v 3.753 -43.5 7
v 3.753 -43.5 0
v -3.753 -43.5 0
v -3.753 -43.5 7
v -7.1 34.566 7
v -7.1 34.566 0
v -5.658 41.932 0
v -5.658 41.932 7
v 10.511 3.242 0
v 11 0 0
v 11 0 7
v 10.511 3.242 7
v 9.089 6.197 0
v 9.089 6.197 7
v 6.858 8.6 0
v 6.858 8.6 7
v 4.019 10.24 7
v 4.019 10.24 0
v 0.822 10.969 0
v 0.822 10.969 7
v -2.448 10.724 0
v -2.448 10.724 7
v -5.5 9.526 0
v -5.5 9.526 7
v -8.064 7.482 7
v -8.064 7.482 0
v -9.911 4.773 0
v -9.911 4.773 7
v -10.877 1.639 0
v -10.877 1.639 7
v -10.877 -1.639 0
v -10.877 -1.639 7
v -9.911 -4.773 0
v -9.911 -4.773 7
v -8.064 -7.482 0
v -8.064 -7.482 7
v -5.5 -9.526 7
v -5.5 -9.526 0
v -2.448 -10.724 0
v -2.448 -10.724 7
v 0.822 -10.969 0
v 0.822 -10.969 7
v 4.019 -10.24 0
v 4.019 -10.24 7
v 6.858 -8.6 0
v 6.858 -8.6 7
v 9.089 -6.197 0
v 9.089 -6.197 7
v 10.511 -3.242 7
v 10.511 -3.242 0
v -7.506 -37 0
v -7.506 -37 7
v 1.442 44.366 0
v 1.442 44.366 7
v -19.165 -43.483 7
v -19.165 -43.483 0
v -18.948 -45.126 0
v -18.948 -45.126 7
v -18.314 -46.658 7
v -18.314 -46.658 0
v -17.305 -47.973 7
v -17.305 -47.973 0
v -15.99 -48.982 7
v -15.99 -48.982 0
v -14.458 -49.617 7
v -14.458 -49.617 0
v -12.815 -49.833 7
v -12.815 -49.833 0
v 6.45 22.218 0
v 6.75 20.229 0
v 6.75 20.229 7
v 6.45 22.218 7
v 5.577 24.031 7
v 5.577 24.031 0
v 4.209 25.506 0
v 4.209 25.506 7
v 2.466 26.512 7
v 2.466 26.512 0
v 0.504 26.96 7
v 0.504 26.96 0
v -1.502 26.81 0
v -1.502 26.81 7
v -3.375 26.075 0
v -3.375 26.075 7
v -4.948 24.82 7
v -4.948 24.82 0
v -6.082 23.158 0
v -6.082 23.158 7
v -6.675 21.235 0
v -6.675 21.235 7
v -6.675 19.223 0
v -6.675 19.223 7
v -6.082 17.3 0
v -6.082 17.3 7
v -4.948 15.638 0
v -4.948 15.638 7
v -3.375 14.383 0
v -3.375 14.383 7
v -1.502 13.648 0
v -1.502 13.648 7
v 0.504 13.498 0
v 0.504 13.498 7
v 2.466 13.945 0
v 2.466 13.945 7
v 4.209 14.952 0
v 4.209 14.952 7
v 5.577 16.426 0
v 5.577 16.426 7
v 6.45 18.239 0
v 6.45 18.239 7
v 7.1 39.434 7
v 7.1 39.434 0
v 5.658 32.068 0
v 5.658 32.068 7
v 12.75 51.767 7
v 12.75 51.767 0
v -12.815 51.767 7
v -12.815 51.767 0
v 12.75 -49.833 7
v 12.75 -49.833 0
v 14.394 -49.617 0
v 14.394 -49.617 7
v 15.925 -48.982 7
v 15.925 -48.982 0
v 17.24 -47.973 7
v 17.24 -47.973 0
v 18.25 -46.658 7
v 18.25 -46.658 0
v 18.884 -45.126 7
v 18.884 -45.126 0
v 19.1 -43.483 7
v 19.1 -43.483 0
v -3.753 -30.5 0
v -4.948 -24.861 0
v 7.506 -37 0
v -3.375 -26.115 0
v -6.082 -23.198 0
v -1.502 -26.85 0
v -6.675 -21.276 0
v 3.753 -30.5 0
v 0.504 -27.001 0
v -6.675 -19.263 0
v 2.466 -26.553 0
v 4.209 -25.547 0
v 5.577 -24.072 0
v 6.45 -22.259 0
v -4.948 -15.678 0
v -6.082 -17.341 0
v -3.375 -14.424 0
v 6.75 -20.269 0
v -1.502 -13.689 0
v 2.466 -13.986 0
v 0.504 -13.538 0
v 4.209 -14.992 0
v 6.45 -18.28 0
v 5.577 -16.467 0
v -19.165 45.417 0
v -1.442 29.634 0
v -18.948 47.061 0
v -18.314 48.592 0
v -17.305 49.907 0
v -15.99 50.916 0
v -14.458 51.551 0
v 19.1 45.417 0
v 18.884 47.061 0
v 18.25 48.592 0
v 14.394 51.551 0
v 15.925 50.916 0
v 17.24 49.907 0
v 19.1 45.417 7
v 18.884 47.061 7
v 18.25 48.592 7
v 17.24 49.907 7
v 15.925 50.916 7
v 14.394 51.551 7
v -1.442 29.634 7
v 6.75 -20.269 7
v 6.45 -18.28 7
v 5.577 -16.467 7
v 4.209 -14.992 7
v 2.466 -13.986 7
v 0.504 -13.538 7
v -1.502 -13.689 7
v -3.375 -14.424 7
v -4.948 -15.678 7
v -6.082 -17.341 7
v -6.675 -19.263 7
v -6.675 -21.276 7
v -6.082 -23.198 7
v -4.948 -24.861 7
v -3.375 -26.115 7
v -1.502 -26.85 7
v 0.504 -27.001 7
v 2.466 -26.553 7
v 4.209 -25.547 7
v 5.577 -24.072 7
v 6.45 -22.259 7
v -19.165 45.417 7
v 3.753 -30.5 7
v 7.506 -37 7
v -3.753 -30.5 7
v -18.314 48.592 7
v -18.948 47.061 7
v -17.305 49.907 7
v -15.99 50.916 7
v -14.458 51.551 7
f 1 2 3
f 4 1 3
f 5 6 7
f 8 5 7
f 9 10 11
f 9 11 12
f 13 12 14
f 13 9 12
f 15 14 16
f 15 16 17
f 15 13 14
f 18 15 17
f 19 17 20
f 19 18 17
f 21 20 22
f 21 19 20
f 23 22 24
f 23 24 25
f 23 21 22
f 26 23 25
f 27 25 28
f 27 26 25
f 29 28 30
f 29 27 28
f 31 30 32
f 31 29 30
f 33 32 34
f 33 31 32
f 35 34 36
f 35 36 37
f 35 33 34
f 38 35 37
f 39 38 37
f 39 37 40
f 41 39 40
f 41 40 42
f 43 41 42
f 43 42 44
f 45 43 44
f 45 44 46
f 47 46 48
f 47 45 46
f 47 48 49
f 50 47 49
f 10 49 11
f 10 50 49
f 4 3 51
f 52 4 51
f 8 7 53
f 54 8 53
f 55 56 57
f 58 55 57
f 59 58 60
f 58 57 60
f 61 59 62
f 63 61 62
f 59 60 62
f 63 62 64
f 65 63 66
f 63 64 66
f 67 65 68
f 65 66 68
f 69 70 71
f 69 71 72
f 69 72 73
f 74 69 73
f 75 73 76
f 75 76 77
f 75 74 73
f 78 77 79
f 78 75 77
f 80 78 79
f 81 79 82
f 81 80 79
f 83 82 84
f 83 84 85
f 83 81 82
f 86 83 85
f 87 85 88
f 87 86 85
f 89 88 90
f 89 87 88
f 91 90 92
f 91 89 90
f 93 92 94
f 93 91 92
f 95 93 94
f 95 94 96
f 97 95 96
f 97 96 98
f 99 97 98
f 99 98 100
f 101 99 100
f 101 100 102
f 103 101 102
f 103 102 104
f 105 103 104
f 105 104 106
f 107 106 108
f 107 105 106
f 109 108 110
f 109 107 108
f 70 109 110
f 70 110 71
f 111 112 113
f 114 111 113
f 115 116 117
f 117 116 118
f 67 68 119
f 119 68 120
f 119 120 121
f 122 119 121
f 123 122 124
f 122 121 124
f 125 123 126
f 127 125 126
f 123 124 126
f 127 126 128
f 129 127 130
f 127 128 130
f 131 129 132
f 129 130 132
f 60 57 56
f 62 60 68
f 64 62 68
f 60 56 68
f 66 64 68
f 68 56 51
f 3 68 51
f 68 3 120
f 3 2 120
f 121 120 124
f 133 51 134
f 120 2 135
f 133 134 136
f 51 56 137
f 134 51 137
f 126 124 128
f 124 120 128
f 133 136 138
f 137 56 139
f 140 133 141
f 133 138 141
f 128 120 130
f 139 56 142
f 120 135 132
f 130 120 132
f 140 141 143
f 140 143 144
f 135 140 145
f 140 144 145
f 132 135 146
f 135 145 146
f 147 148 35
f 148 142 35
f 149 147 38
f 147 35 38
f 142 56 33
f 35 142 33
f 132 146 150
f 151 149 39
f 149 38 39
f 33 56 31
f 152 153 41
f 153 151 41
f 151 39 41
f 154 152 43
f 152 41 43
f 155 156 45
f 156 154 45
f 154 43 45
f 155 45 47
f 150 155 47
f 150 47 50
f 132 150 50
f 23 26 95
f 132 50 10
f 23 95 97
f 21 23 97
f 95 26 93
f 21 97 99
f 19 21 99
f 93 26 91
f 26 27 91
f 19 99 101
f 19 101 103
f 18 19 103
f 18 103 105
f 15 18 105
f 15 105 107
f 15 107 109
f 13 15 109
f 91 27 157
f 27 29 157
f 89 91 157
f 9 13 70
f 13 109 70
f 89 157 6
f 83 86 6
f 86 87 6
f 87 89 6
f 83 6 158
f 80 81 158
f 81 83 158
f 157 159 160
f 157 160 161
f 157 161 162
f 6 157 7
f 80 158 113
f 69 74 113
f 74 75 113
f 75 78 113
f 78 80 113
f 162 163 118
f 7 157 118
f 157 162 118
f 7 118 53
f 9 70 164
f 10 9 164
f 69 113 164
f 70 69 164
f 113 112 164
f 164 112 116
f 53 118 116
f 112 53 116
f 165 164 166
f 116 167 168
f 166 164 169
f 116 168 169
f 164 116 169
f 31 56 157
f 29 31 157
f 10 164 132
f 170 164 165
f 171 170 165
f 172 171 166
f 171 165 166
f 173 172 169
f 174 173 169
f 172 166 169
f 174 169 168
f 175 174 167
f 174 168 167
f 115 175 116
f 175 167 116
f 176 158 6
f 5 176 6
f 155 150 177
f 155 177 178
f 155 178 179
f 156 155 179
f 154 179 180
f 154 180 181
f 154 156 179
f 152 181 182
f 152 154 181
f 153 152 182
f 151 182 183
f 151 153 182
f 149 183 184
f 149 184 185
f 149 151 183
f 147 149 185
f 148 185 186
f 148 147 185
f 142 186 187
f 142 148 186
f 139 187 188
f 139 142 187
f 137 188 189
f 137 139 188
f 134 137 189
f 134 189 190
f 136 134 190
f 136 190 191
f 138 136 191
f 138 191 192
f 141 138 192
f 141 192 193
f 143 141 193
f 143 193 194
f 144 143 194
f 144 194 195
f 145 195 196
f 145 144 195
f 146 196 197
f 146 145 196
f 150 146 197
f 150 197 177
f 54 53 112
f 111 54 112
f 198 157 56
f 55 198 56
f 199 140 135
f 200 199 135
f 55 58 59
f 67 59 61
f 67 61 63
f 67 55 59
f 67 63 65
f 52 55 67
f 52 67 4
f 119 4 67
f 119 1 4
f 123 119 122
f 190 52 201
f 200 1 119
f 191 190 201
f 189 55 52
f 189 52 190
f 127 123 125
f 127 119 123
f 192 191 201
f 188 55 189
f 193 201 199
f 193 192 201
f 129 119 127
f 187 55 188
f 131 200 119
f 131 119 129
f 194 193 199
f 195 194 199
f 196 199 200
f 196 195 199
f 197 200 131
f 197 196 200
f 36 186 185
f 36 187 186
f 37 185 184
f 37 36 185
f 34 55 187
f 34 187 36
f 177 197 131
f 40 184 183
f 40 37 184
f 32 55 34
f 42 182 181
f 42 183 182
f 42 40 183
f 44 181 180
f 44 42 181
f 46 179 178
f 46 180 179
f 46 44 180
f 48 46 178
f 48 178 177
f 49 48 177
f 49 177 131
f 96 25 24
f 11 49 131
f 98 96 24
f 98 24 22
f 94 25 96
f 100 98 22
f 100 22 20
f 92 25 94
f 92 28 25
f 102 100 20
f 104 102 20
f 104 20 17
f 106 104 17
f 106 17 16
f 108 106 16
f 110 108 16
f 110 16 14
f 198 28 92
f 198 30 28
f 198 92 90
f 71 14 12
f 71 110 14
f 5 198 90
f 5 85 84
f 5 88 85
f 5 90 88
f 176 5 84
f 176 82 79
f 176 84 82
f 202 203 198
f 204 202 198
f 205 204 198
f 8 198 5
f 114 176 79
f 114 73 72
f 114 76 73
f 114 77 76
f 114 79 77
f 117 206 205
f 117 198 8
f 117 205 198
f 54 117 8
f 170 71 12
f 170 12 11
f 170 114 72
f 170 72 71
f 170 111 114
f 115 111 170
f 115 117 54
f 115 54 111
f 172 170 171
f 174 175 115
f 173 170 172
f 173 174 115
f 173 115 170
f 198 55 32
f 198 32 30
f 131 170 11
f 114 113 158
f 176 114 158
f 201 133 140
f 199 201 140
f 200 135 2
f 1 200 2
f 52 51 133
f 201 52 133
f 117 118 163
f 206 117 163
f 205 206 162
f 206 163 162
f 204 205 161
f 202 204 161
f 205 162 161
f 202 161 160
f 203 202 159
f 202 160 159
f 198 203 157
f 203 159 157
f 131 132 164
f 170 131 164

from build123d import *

# Parameters (mm, degrees)
F0_R     = 6.75
F0_R_2   = 11
F1_DEPTH = 7


with BuildPart() as f1:
    # F0 (on Top) → F1 (new body)
    with BuildSketch(Plane.XY):
        with BuildLine():
            Line((12.750323, 51.767008), (-12.814607, 51.767008))
            ThreePointArc((-12.814607, 51.767008), (-17.304735, 49.907136), (-19.164607, 45.417008))
            Line((-19.164607, 45.417008), (-19.164607, -43.482992))
            ThreePointArc((-19.164607, -43.482992), (-17.304735, -47.97312), (-12.814607, -49.832992))
            Line((-12.814607, -49.832992), (12.750323, -49.832992))
            ThreePointArc((12.750323, -49.832992), (17.240451, -47.97312), (19.100323, -43.482992))
            Line((19.100323, -43.482992), (19.100323, 45.417008))
            ThreePointArc((19.100323, 45.417008), (17.240451, 49.907136), (12.750323, 51.767008))
        make_face()
        Polygon((7.505553, -37), (3.752777, -43.5), (-3.752777, -43.5), (-7.505553, -37), (-3.752777, -30.5), (3.752777, -30.5), align=None, mode=Mode.SUBTRACT)
        with Locations((0, -20.269467)):
            Circle(F0_R, mode=Mode.SUBTRACT)
        Circle(F0_R_2, mode=Mode.SUBTRACT)
        with Locations((0, 20.228889)):
            Circle(F0_R, mode=Mode.SUBTRACT)
        Polygon((1.442276, 44.365675), (7.1, 39.43379), (5.657724, 32.068115), (-1.442276, 29.634325), (-7.1, 34.56621), (-5.657724, 41.931885), align=None, mode=Mode.SUBTRACT)
    extrude(amount=F1_DEPTH)


solid = f1.part
